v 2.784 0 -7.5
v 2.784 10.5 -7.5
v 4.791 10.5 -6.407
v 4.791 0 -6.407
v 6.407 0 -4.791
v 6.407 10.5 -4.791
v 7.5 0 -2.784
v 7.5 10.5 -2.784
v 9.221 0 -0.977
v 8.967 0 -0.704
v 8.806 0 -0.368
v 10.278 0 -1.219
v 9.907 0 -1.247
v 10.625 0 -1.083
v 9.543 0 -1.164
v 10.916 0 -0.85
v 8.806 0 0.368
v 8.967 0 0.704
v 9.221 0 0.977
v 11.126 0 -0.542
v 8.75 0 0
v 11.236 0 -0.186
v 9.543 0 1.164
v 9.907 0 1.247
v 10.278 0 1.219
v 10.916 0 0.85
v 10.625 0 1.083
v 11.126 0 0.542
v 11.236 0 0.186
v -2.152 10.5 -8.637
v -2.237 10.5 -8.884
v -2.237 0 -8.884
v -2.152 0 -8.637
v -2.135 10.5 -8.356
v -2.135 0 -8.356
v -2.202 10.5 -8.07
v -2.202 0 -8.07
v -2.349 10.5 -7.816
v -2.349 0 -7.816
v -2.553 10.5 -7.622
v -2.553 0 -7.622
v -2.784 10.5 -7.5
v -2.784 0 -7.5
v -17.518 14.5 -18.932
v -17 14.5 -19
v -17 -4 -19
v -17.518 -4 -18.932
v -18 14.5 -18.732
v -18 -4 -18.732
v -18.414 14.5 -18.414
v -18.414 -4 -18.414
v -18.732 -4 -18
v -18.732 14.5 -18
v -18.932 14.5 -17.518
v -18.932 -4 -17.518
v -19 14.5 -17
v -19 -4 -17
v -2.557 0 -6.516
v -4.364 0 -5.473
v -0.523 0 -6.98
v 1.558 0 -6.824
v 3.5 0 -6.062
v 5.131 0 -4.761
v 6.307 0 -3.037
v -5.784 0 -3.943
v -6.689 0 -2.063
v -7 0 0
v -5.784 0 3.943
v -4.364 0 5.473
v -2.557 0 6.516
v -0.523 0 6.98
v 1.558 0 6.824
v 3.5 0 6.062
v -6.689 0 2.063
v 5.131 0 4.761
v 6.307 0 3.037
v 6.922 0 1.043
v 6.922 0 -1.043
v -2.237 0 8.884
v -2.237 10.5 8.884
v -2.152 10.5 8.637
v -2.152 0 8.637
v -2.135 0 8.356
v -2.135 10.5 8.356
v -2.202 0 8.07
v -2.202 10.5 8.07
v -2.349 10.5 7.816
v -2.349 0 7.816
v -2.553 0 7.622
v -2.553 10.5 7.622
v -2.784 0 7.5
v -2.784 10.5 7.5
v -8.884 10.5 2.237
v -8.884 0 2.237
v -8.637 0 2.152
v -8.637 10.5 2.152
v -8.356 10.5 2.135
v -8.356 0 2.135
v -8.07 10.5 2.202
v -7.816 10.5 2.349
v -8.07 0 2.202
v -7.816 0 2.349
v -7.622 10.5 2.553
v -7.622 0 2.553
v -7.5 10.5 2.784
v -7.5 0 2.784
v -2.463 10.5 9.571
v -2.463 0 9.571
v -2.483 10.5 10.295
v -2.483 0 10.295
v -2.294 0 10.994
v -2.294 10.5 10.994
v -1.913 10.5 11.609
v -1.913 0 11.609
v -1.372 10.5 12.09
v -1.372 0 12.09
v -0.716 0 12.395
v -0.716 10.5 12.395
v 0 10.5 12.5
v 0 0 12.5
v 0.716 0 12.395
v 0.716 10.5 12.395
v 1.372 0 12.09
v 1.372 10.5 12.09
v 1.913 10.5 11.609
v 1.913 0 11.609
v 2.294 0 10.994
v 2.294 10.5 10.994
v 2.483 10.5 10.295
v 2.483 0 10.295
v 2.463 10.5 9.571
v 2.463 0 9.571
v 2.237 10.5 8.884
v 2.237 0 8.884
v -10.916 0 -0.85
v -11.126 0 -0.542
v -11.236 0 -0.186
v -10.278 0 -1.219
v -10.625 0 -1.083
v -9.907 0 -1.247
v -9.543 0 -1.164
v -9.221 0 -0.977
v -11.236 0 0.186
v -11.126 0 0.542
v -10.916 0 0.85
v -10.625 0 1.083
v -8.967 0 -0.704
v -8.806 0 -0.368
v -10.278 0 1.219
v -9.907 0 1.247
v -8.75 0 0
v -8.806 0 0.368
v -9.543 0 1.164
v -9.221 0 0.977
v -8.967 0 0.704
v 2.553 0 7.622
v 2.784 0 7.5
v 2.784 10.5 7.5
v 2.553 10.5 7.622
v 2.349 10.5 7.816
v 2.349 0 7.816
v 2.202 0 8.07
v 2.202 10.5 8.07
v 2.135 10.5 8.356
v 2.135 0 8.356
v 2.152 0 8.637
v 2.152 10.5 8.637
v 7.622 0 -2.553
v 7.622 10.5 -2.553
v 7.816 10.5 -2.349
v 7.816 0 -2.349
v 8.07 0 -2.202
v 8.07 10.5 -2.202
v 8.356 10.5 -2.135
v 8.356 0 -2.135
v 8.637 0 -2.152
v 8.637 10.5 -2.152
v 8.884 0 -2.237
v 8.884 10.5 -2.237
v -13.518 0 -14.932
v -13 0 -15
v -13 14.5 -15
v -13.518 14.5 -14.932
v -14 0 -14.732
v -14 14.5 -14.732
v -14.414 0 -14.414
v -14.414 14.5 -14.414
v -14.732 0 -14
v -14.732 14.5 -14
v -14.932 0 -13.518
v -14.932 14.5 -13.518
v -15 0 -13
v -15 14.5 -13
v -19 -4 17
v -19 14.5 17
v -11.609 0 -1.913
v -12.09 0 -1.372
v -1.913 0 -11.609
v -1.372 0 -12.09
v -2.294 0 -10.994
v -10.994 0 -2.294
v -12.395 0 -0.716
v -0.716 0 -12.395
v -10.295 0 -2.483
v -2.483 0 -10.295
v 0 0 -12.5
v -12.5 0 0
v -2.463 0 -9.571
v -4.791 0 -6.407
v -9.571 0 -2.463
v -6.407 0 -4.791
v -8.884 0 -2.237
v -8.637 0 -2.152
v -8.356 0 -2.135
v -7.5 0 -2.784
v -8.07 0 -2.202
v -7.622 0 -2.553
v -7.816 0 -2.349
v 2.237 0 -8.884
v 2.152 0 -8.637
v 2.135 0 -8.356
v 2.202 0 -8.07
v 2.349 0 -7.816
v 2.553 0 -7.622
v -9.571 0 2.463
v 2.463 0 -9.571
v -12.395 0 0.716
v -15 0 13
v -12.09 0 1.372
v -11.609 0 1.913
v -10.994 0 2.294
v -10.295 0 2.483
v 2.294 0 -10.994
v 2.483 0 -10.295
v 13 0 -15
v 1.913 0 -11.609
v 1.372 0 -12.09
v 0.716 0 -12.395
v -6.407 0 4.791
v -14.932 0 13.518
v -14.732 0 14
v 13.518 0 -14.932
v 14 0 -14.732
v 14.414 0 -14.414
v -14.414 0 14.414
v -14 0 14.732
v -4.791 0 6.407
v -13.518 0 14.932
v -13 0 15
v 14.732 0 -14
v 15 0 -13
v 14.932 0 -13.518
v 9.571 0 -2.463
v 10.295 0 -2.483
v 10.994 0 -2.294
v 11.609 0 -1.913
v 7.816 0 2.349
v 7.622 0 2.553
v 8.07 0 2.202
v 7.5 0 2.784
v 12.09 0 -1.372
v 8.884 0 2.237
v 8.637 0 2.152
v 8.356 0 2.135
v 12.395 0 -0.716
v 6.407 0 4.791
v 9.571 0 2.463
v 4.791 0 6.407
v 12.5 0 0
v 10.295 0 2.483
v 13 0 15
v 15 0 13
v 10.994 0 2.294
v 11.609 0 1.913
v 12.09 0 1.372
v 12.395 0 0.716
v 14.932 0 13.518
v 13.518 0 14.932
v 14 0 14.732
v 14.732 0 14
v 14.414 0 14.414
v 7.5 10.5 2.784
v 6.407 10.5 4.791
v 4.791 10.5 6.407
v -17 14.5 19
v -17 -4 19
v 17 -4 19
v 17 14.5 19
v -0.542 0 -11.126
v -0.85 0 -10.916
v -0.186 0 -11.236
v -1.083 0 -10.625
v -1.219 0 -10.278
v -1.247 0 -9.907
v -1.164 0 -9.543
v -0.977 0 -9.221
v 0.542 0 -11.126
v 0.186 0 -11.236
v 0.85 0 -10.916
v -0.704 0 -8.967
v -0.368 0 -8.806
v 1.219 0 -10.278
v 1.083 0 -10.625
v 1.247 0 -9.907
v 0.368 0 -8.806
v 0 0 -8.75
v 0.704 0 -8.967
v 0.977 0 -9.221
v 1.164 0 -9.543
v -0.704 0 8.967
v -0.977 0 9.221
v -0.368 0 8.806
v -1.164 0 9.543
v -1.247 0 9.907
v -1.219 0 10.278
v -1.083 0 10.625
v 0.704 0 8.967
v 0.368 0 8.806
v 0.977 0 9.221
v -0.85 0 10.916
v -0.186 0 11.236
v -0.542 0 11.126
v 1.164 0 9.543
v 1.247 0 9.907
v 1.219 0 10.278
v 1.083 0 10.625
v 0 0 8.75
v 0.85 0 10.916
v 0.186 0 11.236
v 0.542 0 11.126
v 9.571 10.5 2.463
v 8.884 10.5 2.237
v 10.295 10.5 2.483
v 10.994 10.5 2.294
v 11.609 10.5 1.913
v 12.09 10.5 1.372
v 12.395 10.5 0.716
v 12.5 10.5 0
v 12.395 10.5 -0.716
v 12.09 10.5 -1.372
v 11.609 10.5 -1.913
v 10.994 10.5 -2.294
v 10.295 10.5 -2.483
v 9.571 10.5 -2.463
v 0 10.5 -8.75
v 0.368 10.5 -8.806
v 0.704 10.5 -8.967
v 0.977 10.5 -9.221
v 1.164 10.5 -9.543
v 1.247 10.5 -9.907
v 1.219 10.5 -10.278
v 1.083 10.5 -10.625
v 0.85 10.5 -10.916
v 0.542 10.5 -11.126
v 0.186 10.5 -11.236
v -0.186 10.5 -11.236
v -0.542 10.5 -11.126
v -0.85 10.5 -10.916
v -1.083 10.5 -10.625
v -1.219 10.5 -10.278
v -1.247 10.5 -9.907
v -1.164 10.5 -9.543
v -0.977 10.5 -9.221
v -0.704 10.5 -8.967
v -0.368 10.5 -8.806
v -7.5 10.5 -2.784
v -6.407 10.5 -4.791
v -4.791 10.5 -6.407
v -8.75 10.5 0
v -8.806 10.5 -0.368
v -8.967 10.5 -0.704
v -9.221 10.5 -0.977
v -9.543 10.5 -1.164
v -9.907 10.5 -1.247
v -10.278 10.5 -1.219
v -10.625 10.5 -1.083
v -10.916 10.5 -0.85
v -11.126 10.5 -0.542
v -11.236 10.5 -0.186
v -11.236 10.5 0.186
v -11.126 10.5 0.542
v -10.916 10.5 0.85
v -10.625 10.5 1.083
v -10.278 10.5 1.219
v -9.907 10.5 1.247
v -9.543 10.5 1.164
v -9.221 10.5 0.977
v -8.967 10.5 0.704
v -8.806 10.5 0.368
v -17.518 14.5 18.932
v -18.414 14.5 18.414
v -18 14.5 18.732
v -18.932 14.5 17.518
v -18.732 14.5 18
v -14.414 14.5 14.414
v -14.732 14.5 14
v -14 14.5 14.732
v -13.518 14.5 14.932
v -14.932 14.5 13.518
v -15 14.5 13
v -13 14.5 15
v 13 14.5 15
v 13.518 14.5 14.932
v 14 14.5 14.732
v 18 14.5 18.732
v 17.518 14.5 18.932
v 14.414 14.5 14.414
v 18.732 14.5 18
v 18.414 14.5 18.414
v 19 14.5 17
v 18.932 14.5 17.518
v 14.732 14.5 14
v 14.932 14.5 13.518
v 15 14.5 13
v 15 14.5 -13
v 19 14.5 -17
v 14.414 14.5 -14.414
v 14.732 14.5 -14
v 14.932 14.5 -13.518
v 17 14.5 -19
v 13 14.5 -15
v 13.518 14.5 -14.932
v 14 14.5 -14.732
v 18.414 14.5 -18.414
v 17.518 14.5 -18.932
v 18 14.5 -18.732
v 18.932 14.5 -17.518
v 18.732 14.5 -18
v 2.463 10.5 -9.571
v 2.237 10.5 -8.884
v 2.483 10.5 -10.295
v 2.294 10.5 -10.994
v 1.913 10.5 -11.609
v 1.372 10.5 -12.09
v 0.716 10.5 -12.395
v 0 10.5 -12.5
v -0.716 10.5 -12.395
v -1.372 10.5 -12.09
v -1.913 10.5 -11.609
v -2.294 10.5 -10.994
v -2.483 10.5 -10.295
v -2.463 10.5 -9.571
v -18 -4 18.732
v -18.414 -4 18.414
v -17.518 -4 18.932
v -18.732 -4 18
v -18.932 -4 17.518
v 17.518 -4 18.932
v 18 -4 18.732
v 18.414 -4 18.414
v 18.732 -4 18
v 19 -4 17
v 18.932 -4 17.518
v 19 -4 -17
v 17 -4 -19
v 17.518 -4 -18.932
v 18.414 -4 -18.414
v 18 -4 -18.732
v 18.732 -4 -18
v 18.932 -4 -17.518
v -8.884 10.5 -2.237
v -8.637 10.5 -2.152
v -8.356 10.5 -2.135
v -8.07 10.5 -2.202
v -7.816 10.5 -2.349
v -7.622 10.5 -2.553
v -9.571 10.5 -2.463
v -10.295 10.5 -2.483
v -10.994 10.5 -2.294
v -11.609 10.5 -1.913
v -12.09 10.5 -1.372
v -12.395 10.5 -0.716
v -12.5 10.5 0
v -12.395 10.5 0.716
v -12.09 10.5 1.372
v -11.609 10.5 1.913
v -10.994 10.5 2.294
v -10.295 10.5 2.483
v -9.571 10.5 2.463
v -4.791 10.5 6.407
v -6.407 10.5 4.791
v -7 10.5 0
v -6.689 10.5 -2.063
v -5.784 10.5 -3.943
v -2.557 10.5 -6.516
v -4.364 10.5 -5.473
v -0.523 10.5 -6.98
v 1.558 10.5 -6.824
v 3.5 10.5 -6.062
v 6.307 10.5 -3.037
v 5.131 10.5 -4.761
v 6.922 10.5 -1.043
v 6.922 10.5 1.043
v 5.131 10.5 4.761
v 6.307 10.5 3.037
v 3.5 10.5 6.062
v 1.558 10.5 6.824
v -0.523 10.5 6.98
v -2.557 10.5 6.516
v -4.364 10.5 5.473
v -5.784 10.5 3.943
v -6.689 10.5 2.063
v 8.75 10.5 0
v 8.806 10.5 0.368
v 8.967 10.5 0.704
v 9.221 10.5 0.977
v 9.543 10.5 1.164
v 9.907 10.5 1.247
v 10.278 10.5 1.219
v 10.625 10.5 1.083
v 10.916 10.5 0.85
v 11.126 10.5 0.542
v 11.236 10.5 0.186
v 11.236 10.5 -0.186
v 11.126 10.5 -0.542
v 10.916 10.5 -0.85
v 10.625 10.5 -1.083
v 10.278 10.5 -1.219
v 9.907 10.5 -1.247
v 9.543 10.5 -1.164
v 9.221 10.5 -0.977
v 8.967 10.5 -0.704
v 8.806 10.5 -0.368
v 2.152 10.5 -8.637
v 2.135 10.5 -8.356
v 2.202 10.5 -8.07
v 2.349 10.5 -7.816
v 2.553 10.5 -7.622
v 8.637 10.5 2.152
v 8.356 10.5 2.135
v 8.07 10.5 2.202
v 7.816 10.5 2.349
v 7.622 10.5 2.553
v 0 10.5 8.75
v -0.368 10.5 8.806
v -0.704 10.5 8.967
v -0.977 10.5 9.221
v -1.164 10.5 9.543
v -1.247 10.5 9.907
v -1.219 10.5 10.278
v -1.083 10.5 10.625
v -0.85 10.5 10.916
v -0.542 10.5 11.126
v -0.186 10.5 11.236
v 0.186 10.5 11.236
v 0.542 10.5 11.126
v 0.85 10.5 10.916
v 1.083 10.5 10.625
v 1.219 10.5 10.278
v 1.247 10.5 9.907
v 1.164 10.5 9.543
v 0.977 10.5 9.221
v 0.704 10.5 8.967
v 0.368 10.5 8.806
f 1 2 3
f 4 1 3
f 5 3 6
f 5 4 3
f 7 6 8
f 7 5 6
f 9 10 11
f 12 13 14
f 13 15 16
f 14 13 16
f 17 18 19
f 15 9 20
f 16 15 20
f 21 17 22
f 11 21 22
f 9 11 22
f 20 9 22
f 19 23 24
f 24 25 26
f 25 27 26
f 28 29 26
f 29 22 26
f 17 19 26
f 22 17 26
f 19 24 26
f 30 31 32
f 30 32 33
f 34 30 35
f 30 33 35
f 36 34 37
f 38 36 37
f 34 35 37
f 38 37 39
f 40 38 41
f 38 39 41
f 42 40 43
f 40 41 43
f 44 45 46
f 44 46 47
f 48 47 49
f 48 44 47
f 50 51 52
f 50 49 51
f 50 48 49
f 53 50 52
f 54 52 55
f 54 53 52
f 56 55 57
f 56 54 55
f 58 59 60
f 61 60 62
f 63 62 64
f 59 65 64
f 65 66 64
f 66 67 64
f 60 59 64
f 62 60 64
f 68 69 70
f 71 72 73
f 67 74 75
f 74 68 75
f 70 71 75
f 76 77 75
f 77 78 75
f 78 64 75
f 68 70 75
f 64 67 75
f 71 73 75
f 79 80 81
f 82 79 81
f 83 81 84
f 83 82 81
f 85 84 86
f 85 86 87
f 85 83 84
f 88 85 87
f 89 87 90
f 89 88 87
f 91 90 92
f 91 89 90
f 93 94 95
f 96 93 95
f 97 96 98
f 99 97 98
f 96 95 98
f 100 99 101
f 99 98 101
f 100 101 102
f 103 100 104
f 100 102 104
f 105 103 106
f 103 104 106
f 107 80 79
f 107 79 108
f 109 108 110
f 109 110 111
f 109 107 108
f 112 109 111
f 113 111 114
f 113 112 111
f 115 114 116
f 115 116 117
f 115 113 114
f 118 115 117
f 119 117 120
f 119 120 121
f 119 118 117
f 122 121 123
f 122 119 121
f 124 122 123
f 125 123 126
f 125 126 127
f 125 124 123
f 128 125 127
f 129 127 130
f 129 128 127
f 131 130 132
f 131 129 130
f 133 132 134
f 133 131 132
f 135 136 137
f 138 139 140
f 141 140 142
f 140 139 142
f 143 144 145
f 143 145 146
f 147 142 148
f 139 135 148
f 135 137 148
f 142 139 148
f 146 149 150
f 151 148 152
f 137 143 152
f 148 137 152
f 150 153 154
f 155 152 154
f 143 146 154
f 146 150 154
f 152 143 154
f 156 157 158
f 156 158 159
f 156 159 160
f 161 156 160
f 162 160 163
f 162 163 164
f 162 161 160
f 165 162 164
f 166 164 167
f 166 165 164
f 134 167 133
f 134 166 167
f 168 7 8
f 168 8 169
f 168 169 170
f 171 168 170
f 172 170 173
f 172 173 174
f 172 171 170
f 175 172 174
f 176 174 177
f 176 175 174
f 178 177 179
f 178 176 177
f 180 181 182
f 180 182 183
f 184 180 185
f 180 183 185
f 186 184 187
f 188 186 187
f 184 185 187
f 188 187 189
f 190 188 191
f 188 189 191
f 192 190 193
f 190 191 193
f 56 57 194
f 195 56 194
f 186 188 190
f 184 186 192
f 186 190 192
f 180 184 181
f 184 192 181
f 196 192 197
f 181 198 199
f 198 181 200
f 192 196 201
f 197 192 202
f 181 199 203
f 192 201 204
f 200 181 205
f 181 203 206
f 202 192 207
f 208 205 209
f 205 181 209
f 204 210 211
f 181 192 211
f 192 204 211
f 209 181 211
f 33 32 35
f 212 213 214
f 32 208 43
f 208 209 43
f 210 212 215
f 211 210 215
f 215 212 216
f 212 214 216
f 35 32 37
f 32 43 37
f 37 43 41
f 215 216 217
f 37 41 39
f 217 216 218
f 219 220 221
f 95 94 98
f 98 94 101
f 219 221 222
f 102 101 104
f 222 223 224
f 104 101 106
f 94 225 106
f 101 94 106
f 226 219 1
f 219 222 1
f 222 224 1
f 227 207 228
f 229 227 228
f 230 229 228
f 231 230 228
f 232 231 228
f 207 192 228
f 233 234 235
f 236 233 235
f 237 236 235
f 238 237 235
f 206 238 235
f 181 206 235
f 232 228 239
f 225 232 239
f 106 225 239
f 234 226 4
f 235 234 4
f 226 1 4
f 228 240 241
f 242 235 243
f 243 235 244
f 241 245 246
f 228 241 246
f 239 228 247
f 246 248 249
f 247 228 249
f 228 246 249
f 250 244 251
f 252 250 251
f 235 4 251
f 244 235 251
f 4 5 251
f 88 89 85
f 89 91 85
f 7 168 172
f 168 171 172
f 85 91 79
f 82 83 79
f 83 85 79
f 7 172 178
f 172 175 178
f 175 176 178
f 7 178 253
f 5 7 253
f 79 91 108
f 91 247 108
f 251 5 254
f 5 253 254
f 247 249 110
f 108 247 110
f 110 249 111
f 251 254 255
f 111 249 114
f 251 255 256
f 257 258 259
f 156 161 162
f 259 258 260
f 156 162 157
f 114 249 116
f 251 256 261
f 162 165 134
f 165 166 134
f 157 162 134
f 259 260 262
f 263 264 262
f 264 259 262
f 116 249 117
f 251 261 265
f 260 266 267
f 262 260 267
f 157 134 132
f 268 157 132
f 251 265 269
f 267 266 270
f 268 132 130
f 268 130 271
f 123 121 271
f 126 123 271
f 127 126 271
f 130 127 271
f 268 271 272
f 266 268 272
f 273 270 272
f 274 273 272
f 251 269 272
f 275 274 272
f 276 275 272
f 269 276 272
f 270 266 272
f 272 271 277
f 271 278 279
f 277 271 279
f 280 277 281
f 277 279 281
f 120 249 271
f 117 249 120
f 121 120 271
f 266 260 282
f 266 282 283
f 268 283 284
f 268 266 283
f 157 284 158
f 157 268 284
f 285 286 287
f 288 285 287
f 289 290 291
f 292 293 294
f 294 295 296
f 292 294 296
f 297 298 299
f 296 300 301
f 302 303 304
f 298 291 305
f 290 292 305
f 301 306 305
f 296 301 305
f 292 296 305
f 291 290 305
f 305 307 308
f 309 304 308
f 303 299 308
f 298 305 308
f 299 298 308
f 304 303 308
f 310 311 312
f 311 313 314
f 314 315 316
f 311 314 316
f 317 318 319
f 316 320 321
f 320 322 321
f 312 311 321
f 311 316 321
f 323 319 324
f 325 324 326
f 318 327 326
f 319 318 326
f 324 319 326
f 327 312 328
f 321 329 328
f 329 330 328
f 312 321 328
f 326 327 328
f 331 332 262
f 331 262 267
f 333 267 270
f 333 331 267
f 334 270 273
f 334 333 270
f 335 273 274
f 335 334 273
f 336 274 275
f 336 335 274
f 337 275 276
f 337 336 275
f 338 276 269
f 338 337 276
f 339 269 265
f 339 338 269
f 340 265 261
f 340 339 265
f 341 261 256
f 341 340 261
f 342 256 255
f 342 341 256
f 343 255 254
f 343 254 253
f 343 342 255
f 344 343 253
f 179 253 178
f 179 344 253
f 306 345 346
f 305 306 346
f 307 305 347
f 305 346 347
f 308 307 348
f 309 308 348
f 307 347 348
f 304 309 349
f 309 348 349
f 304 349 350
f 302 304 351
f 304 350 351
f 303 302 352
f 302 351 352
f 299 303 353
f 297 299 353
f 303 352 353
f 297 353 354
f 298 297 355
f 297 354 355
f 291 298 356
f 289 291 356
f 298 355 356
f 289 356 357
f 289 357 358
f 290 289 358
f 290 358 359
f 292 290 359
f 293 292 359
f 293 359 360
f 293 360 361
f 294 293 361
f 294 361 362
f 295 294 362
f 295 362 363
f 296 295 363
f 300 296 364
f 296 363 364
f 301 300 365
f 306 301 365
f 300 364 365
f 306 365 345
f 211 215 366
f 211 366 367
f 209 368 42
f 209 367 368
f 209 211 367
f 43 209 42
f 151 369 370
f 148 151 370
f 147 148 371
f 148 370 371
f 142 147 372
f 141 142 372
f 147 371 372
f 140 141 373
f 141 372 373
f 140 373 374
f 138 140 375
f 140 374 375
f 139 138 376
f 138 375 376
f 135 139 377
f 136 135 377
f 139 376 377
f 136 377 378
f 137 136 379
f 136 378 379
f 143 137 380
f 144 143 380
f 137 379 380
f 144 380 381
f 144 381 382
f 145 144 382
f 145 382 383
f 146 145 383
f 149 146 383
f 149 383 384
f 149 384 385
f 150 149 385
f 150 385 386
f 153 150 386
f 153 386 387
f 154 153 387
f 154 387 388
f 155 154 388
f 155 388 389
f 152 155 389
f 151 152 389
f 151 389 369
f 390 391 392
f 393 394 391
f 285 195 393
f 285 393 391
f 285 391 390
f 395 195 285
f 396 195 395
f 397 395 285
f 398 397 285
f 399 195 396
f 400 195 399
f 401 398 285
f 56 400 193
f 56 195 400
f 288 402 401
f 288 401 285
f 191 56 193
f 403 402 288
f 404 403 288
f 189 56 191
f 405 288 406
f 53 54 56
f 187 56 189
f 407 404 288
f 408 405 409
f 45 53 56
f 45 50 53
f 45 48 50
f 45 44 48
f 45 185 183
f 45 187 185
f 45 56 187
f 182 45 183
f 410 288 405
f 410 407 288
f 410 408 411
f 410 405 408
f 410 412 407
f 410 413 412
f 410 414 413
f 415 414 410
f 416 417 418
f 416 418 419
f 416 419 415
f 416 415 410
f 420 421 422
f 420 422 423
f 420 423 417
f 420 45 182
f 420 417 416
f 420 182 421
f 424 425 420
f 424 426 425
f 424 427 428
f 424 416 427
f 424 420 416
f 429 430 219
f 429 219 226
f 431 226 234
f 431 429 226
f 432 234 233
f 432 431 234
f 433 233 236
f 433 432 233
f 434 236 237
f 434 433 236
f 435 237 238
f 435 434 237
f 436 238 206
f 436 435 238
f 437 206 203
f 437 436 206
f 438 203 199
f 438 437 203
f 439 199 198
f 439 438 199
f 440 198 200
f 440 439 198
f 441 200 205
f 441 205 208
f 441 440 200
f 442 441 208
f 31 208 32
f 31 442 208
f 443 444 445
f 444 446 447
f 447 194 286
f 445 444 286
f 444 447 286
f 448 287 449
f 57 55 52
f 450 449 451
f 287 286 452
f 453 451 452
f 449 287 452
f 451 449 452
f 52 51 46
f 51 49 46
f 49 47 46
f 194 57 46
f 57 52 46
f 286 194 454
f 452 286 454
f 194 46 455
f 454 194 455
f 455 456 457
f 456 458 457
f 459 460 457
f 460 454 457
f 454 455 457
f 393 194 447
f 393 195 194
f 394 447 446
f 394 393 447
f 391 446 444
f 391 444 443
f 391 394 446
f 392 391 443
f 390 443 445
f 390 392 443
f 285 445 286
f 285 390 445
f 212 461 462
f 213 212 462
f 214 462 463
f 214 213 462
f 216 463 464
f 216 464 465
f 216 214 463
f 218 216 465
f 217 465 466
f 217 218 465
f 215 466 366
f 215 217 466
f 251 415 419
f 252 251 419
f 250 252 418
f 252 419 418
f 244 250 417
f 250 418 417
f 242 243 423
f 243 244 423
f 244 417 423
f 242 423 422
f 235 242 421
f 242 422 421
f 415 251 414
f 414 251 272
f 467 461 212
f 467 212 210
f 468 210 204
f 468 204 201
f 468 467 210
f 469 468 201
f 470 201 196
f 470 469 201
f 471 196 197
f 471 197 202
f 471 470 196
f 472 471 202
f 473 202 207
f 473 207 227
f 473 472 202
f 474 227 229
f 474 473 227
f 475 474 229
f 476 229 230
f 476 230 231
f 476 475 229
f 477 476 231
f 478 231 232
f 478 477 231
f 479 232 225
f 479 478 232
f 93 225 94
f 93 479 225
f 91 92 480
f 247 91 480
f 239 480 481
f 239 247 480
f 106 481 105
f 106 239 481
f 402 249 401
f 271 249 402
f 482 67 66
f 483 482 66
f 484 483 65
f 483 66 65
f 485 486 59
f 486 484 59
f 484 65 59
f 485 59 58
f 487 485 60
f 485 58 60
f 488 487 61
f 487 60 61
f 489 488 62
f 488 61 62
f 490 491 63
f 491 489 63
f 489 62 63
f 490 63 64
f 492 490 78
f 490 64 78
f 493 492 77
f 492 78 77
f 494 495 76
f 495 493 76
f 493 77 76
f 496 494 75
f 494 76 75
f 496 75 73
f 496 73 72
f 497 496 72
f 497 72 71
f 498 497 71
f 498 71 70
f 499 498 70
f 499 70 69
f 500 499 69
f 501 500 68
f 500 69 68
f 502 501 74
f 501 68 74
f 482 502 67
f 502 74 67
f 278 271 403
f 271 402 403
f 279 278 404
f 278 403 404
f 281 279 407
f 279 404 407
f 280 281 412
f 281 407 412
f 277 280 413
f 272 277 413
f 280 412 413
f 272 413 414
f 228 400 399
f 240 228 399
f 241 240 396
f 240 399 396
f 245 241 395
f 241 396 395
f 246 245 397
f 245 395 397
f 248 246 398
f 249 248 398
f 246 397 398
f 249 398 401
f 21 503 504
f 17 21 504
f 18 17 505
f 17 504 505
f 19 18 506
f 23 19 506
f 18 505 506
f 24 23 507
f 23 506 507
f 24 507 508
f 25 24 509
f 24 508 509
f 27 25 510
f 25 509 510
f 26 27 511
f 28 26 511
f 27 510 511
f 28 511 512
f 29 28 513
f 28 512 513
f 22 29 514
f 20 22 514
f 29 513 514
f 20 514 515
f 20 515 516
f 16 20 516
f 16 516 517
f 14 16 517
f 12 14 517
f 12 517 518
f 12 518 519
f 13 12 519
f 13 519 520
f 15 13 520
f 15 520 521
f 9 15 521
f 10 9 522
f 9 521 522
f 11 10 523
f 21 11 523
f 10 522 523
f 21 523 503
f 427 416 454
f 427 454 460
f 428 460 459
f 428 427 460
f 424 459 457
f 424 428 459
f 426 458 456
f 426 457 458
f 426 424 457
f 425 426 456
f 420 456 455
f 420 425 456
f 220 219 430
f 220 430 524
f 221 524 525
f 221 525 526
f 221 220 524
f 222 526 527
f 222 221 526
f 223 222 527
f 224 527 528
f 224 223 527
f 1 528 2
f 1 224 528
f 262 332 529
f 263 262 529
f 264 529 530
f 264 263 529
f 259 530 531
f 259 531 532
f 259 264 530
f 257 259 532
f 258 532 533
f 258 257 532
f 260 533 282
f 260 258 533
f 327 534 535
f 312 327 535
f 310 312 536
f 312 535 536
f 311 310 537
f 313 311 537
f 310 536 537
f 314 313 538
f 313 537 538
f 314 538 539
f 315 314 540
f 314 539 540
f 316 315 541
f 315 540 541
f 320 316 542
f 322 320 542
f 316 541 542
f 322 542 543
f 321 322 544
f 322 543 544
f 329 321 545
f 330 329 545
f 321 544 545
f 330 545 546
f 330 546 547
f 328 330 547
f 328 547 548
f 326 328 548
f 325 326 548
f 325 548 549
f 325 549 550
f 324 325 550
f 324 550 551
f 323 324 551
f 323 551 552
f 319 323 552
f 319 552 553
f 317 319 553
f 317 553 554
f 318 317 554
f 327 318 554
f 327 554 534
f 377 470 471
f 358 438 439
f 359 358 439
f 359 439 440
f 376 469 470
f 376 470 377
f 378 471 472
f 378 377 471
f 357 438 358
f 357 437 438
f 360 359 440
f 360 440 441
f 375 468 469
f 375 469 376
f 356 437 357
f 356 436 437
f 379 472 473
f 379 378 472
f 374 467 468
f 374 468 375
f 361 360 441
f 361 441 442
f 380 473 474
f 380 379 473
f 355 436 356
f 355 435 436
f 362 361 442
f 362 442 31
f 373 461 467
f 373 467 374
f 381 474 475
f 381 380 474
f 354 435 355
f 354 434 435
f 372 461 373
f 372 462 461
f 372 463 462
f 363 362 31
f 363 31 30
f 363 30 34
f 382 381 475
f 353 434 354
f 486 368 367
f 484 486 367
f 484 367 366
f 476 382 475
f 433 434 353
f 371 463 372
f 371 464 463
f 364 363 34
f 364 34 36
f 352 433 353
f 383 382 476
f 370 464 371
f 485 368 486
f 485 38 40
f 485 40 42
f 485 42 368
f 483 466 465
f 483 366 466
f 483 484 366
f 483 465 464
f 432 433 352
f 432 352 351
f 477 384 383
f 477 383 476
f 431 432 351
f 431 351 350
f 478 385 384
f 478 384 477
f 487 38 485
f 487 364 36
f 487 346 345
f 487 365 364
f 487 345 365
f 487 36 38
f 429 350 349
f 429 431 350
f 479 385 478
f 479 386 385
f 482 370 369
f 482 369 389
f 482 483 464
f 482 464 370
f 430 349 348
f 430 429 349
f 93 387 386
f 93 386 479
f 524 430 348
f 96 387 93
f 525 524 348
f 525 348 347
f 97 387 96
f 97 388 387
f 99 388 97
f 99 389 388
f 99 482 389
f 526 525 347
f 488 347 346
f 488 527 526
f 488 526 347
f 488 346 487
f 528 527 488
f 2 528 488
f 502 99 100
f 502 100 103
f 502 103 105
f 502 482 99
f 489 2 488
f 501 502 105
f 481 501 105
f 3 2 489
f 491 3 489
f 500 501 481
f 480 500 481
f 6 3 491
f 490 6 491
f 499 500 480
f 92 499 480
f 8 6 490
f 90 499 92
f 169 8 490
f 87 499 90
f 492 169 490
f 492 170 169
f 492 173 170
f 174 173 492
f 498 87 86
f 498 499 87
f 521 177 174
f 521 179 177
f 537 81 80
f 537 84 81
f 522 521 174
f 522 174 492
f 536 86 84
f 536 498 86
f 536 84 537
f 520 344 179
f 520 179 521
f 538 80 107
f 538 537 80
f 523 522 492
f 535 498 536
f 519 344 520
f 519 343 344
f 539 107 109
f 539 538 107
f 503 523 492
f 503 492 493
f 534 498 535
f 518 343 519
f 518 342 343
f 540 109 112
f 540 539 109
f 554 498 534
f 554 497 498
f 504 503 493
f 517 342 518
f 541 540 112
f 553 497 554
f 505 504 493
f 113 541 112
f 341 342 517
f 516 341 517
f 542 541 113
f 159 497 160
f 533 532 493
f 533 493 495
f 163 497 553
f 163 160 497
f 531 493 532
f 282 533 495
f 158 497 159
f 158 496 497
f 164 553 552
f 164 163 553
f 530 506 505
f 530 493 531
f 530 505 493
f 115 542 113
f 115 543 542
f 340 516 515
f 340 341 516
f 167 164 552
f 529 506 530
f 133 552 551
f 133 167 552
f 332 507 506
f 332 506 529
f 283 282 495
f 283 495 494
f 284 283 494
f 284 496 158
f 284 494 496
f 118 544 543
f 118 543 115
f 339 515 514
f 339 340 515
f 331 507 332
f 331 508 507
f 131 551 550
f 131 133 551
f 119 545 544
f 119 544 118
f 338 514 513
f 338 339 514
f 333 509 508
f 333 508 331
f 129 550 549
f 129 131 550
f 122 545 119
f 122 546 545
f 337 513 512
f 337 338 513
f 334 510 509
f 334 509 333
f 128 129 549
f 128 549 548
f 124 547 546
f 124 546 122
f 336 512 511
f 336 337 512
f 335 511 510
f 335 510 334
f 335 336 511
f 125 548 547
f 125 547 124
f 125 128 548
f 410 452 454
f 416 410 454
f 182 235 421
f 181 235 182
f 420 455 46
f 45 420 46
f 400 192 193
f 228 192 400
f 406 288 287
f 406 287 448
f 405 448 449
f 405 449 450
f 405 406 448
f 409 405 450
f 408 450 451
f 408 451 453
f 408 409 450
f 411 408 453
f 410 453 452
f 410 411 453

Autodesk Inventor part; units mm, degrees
ref_plane "YZ Plane" through (0, 0, 0) normal (1, 0, 0) x (0, 1, 0)
ref_plane "XZ Plane" through (0, 0, 0) normal (0, 1, 0) x (-1, 0, 0)
ref_plane "XY Plane" through (0, 0, 0) normal (0, 0, 1) x (1, 0, 0)
sketch "Sketch1" plane through (0, 0, 0) normal (0, 1, 0) x (-1, 0, 0)
  circle A0 centre (0, 0) radius 7
  circle A1 centre (0, 0) radius 8
  dimension "d0" = 14
  dimension "d1" = 1
extrude "Extrusion1" add sketch "Sketch1" along normal blind 10.5
sketch "Sketch2" plane through (0, 0, 0) normal (0, -1, 0) x (1, 0, 0)
  circle A0 centre (0, 0) radius 8
extrude "Extrusion2" [suppressed]
sketch "Sketch4" plane through (0, 10.5, 0) normal (0, 1, 0) x (1, 0, 0)
  circle A0 centre (-10, 0) radius 1.25
  circle A1 centre (-10, 0) radius 2.5
  point P0 (0, 0)
  dimension "d6" = 5
  dimension "d7" = 2.5
  dimension "d8" = 10
extrude "Extrusion3" add sketch "Sketch4" against normal up to surface (10.5 mm away)
pattern_circular "Circular Pattern1" count 4 over 360 about axis through (0, 0, 0) along (0, 1, 0) of "Extrusion3"
fillet "Fillet1" radius 1 8 edges at (7.8875, 5.25, -1.3369) (7.8875, 5.25, 1.3369) (1.3369, 5.25, 7.8875) (-1.3369, 5.25, 7.8875) (-7.8875, 5.25, 1.3369) (-7.8875, 5.25, -1.3369) (-1.3369, 5.25, -7.8875) (1.3369, 5.25, -7.8875)
sketch "Sketch5" plane through (0, 0, 0) normal (0, -1, 0) x (1, 0, 0)
  line L0 (-15, -15) -> (15, -15)
  line L1 (15, -15) -> (15, 15)
  line L2 (15, 15) -> (-15, 15)
  line L3 (-15, 15) -> (-15, -15)
  line L4 (-15, -15) -> (15, 15) construction
  line L5 (15, -15) -> (-15, 15) construction
  point P0 (0, 0)
  dimension "d23" = 30
  dimension "d24" = 30
extrude "Extrusion4" add sketch "Sketch5" along normal blind 4
sketch "Sketch6" plane through (0, -4, 0) normal (0, 1, 0) x (1, 0, 0)
  line L0 (15, 15) -> (15, -15) projected
  line L1 (-15, -15) -> (15, -15)
  line L2 (15, -15) -> (15, 15)
  line L3 (15, 15) -> (-15, 15)
  line L4 (-15, 15) -> (-15, -15)
  line L5 (-15, -15) -> (15, 15) construction
  line L6 (15, -15) -> (-15, 15) construction
  line L7 (-19, -19) -> (19, -19)
  line L8 (19, -19) -> (19, 19)
  line L9 (19, 19) -> (-19, 19)
  line L10 (-19, 19) -> (-19, -19)
  line L11 (-19, -19) -> (19, 19) construction
  line L12 (19, -19) -> (-19, 19) construction
  point P0 (0, 0)
  dimension "d27" = 4
  dimension "d28" = 4
extrude "Extrusion5" add sketch "Sketch6" along normal blind 18.5
fillet "Fillet2" radius 2 8 edges at (-15, 7.25, -15) (15, 7.25, -15) (-15, 7.25, 15) (15, 7.25, 15) (19, 5.25, 19) (19, 5.25, -19) (-19, 5.25, 19) (-19, 5.25, -19)
properties part number "Ecoflex_mould"
